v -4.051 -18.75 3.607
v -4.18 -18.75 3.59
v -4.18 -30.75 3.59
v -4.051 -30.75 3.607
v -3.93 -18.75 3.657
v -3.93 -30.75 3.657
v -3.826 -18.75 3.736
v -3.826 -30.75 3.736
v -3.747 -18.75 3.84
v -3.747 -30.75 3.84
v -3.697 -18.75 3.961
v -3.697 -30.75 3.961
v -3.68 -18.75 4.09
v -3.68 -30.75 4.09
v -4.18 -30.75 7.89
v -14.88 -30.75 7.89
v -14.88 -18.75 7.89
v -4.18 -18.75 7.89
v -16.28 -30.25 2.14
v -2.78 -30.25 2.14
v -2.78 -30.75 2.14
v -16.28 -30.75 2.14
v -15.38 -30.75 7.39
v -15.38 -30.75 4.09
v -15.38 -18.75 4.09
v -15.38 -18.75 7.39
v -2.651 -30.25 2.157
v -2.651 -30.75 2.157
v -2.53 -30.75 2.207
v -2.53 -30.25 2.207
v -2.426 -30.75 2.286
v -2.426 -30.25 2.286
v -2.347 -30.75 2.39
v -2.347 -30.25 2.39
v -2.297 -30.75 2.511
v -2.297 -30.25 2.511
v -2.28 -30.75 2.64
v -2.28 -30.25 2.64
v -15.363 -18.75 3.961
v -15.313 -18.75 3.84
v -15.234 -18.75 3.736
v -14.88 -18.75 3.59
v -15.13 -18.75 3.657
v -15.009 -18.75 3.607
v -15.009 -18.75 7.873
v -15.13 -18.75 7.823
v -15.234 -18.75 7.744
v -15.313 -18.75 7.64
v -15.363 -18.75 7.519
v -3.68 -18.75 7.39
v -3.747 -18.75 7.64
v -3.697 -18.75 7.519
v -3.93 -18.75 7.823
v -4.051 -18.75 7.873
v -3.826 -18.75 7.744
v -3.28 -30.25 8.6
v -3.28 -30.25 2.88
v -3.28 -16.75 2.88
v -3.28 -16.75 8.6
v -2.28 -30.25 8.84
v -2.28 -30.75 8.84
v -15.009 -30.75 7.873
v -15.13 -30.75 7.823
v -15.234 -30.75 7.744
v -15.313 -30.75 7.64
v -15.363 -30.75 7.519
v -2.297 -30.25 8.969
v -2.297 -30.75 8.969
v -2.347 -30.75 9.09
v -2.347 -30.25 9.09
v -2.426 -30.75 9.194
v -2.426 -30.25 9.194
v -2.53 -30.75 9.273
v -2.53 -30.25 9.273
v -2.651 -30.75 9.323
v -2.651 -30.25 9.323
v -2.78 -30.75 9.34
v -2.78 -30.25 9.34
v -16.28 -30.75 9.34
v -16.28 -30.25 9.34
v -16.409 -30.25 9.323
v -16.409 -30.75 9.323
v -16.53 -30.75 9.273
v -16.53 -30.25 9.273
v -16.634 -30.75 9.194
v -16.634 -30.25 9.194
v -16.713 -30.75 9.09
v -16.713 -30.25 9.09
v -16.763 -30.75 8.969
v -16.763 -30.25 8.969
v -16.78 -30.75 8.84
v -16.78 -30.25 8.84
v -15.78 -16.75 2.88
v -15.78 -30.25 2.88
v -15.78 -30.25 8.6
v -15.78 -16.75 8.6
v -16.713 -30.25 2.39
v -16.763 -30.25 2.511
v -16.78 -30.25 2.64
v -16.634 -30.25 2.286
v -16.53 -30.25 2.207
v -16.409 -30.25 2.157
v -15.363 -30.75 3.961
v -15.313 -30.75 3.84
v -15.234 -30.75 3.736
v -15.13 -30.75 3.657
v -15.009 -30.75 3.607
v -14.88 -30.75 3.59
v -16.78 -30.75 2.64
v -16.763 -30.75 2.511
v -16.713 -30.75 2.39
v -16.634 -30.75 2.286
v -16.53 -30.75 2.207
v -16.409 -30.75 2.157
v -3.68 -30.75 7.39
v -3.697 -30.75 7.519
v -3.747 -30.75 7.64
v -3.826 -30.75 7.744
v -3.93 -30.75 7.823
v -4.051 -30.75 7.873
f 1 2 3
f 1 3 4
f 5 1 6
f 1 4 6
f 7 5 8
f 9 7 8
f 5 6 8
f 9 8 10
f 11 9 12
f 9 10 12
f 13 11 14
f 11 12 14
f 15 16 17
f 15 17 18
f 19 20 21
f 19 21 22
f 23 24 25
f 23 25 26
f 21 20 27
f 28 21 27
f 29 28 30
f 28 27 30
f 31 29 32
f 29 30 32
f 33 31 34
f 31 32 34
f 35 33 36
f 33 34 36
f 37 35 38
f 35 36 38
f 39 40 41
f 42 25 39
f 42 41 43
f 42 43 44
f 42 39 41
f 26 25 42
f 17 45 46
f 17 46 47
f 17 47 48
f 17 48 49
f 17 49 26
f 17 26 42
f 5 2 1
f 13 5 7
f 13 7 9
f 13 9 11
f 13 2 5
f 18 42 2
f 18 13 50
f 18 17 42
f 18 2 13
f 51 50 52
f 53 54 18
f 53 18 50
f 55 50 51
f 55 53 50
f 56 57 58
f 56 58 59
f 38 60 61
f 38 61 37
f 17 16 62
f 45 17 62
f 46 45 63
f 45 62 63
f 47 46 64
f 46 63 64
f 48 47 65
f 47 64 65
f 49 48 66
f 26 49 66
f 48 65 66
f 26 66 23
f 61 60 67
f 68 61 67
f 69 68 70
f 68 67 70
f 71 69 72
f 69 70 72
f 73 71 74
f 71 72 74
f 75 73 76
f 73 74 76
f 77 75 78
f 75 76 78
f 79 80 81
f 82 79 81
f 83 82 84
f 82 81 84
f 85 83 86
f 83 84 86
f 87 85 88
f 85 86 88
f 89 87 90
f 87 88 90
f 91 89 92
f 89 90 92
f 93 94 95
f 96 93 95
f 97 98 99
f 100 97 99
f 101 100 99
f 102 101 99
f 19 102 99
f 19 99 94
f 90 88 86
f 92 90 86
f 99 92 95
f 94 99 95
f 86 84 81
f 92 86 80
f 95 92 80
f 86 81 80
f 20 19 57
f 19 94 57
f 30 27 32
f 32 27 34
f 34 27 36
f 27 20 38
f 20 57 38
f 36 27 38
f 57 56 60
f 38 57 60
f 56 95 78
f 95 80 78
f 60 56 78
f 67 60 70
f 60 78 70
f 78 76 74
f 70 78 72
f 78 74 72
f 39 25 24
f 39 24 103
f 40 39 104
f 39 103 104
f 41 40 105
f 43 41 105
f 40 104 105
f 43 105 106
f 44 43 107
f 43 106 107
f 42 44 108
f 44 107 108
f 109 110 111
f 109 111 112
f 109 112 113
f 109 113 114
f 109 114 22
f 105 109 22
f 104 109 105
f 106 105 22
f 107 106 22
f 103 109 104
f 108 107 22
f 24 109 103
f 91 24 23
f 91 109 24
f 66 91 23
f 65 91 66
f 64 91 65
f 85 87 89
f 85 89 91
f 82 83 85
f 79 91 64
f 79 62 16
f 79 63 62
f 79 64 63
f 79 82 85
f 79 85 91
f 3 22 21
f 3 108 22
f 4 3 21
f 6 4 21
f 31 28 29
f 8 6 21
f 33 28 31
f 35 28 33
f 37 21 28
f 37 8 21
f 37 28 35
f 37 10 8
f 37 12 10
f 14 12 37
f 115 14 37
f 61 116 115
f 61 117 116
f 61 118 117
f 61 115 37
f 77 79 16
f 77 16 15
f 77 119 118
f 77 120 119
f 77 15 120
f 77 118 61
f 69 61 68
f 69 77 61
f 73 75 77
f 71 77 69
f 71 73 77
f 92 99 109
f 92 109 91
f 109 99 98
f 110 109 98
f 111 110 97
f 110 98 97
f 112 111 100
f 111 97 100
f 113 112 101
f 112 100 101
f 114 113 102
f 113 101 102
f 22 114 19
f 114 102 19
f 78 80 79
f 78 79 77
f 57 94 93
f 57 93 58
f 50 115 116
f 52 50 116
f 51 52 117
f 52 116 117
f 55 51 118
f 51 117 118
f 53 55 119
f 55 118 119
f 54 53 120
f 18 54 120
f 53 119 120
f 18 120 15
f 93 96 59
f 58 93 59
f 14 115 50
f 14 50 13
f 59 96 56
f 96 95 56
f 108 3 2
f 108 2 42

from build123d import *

# Parameters (mm, degrees)
SKETCH009_W     = 12.5
SKETCH009_H     = 5.72
PAD007_DEPTH    = 6.75
PAD008_DEPTH    = 0.5
POCKET002_DEPTH = 12


with BuildPart() as part:
    # Sketch009 → Pad007 (new body, symmetric)
    with BuildSketch(Plane.XZ):
        with Locations((0, 4.14)):
            Rectangle(SKETCH009_W, SKETCH009_H)
    extrude(amount=PAD007_DEPTH, both=True)

    # Sketch010 (on Face6 of Pad007) → Pad008 (join)
    with BuildSketch(Plane.XZ.offset(6.75)):
        with BuildLine():
            ThreePointArc((-6.75, 7.74), (-7.103553, 7.593553), (-7.25, 7.24))
            Line((-7.25, 1.04), (-7.25, 7.24))
            ThreePointArc((-7.25, 1.04), (-7.103553, 0.686447), (-6.75, 0.54))
            Line((6.75, 0.54), (-6.75, 0.54))
            ThreePointArc((6.75, 0.54), (7.103553, 0.686447), (7.25, 1.04))
            Line((7.25, 7.24), (7.25, 1.04))
            ThreePointArc((7.25, 7.24), (7.103553, 7.593553), (6.75, 7.74))
            Line((-6.75, 7.74), (6.75, 7.74))
        make_face()
    extrude(amount=PAD008_DEPTH)

    # Sketch011 (on Face5 of Pad008) → Pocket002 (cut)
    with BuildSketch(Plane.XZ.offset(7.25)):
        with BuildLine():
            ThreePointArc((-5.35, 6.29), (-5.703553, 6.143553), (-5.85, 5.79))
            Line((-5.85, 2.49), (-5.85, 5.79))
            ThreePointArc((-5.85, 2.49), (-5.703553, 2.136447), (-5.35, 1.99))
            Line((5.35, 1.99), (-5.35, 1.99))
            ThreePointArc((5.35, 1.99), (5.703553, 2.136447), (5.85, 2.49))
            Line((5.85, 5.79), (5.85, 2.49))
            ThreePointArc((5.85, 5.79), (5.703553, 6.143553), (5.35, 6.29))
            Line((-5.35, 6.29), (5.35, 6.29))
        make_face()
    extrude(amount=-POCKET002_DEPTH, mode=Mode.SUBTRACT)


with BuildPart() as part_1:
    # Body004 placement: moved
    add(part.part.moved(Location((-9.53, -23.5, 1.6))))


solid = part_1.part
